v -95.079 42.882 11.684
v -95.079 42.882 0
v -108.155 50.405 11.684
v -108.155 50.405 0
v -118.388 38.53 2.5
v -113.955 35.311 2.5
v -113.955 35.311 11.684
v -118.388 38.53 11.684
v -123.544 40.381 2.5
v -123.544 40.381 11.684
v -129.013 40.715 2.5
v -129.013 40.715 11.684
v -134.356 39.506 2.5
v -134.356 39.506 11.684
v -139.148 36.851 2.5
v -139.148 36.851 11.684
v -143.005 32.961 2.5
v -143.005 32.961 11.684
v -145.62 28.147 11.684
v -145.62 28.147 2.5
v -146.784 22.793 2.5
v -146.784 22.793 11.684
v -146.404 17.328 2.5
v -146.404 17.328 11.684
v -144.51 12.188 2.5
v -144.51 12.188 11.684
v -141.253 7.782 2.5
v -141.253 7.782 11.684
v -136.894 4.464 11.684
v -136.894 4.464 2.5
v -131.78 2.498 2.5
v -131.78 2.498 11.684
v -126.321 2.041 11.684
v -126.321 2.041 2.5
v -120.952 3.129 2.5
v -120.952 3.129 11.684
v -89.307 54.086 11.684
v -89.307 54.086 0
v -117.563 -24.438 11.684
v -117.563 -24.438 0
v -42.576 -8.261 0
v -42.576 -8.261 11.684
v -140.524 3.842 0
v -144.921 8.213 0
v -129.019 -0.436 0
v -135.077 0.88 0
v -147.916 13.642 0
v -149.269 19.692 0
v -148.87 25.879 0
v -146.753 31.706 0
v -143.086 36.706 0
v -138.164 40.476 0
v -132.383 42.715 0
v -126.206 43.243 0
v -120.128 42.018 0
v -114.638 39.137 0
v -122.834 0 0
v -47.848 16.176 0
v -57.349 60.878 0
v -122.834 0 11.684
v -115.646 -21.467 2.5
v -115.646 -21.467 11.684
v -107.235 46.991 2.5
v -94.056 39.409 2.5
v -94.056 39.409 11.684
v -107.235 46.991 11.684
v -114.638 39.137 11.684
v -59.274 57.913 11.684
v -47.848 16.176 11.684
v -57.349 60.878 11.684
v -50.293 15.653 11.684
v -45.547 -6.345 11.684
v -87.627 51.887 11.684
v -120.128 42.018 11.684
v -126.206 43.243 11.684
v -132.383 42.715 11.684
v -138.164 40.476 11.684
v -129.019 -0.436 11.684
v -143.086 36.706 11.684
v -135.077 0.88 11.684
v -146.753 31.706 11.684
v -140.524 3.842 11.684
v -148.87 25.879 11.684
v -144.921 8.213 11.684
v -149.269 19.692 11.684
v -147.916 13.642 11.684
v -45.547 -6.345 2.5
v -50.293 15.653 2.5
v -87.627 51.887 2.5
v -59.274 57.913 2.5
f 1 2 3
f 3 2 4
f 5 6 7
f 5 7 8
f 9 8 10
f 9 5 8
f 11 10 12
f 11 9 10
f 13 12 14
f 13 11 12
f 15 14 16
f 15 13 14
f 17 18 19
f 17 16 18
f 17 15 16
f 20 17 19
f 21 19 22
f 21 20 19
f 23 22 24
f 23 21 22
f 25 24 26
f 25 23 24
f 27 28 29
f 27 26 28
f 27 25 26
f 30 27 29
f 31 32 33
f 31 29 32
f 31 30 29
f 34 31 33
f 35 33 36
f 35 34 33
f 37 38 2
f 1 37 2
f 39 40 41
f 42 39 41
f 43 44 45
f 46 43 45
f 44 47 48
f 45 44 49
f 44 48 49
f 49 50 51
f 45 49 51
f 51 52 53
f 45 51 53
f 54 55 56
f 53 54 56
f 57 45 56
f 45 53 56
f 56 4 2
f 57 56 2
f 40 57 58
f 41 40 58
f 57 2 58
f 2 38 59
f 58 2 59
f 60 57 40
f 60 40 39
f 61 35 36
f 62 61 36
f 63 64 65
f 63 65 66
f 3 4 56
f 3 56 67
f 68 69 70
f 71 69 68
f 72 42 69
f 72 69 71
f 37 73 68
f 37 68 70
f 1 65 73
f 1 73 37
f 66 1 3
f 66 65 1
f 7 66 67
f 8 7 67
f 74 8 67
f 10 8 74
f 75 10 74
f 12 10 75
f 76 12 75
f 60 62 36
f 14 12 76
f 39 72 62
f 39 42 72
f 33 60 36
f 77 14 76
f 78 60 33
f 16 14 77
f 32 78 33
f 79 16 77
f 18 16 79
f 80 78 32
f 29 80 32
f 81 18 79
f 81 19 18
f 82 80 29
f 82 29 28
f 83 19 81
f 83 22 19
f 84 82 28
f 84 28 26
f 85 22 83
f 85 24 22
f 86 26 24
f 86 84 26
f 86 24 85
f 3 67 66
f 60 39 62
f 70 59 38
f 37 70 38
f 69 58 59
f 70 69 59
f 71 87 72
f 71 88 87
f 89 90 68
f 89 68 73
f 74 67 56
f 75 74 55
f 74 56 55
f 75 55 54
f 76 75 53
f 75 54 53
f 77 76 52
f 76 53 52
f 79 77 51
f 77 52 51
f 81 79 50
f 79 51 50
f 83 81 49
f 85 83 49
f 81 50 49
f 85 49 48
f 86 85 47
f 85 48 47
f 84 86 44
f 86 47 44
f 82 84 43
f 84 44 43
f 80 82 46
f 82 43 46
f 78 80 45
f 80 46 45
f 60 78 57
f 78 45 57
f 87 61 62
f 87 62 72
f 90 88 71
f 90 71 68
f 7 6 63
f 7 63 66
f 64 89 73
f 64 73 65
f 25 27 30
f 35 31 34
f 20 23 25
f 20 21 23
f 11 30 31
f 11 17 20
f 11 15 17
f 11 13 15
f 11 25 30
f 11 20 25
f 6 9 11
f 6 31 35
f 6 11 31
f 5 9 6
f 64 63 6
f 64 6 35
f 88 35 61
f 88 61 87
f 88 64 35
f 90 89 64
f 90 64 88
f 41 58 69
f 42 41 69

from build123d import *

# Parameters (mm, degrees)
F1_DEPTH = 11.684
F2_DEPTH = 25
F3_DEPTH = 13
F4_T     = -2.5


with BuildPart() as f1:
    # F0 (on Top) → F1 (new body)
    with BuildSketch(Plane.XY):
        with BuildLine():
            Line((-101.0389998555, 31.3125476241), (-114.6383360028, 39.1371101141))
            ThreePointArc((-114.6383360028, 39.1371101141), (-148.8700631478, 25.8791054822), (-122.8343620896, 0))
            Line((-122.8343620896, 0), (-47.8479606974, 16.1763411877))
            Line((-47.8479606974, 16.1763411877), (-57.3485940695, 60.8779378235))
            Line((-57.3485940695, 60.8779378235), (-89.3066003919, 54.0857575834))
            Line((-89.3066003919, 54.0857575834), (-101.0389998555, 31.3125476241))
        make_face()
    extrude(amount=F1_DEPTH)

    # F2 (add): a face of the model
    f2_faces = [f1.faces().sort_by_distance(p)[0] for p in [
        (-85.3411613935, 8.0881705939, 5.842),
    ]]
    extrude(f2_faces, amount=F2_DEPTH)

    # F3 (add): a face of the model
    f3_faces = [f1.faces().sort_by_distance(p)[0] for p in [
        (-107.8386679292, 35.2248288691, 5.842),
    ]]
    extrude(f3_faces, amount=F3_DEPTH)

    # F4
    f4_openings = [f1.faces().sort_by_distance(p)[0] for p in [
        (-92.967353, 17.456515, 11.684),
    ]]
    offset(amount=F4_T, openings=f4_openings, kind=Kind.INTERSECTION)


solid = f1.part
